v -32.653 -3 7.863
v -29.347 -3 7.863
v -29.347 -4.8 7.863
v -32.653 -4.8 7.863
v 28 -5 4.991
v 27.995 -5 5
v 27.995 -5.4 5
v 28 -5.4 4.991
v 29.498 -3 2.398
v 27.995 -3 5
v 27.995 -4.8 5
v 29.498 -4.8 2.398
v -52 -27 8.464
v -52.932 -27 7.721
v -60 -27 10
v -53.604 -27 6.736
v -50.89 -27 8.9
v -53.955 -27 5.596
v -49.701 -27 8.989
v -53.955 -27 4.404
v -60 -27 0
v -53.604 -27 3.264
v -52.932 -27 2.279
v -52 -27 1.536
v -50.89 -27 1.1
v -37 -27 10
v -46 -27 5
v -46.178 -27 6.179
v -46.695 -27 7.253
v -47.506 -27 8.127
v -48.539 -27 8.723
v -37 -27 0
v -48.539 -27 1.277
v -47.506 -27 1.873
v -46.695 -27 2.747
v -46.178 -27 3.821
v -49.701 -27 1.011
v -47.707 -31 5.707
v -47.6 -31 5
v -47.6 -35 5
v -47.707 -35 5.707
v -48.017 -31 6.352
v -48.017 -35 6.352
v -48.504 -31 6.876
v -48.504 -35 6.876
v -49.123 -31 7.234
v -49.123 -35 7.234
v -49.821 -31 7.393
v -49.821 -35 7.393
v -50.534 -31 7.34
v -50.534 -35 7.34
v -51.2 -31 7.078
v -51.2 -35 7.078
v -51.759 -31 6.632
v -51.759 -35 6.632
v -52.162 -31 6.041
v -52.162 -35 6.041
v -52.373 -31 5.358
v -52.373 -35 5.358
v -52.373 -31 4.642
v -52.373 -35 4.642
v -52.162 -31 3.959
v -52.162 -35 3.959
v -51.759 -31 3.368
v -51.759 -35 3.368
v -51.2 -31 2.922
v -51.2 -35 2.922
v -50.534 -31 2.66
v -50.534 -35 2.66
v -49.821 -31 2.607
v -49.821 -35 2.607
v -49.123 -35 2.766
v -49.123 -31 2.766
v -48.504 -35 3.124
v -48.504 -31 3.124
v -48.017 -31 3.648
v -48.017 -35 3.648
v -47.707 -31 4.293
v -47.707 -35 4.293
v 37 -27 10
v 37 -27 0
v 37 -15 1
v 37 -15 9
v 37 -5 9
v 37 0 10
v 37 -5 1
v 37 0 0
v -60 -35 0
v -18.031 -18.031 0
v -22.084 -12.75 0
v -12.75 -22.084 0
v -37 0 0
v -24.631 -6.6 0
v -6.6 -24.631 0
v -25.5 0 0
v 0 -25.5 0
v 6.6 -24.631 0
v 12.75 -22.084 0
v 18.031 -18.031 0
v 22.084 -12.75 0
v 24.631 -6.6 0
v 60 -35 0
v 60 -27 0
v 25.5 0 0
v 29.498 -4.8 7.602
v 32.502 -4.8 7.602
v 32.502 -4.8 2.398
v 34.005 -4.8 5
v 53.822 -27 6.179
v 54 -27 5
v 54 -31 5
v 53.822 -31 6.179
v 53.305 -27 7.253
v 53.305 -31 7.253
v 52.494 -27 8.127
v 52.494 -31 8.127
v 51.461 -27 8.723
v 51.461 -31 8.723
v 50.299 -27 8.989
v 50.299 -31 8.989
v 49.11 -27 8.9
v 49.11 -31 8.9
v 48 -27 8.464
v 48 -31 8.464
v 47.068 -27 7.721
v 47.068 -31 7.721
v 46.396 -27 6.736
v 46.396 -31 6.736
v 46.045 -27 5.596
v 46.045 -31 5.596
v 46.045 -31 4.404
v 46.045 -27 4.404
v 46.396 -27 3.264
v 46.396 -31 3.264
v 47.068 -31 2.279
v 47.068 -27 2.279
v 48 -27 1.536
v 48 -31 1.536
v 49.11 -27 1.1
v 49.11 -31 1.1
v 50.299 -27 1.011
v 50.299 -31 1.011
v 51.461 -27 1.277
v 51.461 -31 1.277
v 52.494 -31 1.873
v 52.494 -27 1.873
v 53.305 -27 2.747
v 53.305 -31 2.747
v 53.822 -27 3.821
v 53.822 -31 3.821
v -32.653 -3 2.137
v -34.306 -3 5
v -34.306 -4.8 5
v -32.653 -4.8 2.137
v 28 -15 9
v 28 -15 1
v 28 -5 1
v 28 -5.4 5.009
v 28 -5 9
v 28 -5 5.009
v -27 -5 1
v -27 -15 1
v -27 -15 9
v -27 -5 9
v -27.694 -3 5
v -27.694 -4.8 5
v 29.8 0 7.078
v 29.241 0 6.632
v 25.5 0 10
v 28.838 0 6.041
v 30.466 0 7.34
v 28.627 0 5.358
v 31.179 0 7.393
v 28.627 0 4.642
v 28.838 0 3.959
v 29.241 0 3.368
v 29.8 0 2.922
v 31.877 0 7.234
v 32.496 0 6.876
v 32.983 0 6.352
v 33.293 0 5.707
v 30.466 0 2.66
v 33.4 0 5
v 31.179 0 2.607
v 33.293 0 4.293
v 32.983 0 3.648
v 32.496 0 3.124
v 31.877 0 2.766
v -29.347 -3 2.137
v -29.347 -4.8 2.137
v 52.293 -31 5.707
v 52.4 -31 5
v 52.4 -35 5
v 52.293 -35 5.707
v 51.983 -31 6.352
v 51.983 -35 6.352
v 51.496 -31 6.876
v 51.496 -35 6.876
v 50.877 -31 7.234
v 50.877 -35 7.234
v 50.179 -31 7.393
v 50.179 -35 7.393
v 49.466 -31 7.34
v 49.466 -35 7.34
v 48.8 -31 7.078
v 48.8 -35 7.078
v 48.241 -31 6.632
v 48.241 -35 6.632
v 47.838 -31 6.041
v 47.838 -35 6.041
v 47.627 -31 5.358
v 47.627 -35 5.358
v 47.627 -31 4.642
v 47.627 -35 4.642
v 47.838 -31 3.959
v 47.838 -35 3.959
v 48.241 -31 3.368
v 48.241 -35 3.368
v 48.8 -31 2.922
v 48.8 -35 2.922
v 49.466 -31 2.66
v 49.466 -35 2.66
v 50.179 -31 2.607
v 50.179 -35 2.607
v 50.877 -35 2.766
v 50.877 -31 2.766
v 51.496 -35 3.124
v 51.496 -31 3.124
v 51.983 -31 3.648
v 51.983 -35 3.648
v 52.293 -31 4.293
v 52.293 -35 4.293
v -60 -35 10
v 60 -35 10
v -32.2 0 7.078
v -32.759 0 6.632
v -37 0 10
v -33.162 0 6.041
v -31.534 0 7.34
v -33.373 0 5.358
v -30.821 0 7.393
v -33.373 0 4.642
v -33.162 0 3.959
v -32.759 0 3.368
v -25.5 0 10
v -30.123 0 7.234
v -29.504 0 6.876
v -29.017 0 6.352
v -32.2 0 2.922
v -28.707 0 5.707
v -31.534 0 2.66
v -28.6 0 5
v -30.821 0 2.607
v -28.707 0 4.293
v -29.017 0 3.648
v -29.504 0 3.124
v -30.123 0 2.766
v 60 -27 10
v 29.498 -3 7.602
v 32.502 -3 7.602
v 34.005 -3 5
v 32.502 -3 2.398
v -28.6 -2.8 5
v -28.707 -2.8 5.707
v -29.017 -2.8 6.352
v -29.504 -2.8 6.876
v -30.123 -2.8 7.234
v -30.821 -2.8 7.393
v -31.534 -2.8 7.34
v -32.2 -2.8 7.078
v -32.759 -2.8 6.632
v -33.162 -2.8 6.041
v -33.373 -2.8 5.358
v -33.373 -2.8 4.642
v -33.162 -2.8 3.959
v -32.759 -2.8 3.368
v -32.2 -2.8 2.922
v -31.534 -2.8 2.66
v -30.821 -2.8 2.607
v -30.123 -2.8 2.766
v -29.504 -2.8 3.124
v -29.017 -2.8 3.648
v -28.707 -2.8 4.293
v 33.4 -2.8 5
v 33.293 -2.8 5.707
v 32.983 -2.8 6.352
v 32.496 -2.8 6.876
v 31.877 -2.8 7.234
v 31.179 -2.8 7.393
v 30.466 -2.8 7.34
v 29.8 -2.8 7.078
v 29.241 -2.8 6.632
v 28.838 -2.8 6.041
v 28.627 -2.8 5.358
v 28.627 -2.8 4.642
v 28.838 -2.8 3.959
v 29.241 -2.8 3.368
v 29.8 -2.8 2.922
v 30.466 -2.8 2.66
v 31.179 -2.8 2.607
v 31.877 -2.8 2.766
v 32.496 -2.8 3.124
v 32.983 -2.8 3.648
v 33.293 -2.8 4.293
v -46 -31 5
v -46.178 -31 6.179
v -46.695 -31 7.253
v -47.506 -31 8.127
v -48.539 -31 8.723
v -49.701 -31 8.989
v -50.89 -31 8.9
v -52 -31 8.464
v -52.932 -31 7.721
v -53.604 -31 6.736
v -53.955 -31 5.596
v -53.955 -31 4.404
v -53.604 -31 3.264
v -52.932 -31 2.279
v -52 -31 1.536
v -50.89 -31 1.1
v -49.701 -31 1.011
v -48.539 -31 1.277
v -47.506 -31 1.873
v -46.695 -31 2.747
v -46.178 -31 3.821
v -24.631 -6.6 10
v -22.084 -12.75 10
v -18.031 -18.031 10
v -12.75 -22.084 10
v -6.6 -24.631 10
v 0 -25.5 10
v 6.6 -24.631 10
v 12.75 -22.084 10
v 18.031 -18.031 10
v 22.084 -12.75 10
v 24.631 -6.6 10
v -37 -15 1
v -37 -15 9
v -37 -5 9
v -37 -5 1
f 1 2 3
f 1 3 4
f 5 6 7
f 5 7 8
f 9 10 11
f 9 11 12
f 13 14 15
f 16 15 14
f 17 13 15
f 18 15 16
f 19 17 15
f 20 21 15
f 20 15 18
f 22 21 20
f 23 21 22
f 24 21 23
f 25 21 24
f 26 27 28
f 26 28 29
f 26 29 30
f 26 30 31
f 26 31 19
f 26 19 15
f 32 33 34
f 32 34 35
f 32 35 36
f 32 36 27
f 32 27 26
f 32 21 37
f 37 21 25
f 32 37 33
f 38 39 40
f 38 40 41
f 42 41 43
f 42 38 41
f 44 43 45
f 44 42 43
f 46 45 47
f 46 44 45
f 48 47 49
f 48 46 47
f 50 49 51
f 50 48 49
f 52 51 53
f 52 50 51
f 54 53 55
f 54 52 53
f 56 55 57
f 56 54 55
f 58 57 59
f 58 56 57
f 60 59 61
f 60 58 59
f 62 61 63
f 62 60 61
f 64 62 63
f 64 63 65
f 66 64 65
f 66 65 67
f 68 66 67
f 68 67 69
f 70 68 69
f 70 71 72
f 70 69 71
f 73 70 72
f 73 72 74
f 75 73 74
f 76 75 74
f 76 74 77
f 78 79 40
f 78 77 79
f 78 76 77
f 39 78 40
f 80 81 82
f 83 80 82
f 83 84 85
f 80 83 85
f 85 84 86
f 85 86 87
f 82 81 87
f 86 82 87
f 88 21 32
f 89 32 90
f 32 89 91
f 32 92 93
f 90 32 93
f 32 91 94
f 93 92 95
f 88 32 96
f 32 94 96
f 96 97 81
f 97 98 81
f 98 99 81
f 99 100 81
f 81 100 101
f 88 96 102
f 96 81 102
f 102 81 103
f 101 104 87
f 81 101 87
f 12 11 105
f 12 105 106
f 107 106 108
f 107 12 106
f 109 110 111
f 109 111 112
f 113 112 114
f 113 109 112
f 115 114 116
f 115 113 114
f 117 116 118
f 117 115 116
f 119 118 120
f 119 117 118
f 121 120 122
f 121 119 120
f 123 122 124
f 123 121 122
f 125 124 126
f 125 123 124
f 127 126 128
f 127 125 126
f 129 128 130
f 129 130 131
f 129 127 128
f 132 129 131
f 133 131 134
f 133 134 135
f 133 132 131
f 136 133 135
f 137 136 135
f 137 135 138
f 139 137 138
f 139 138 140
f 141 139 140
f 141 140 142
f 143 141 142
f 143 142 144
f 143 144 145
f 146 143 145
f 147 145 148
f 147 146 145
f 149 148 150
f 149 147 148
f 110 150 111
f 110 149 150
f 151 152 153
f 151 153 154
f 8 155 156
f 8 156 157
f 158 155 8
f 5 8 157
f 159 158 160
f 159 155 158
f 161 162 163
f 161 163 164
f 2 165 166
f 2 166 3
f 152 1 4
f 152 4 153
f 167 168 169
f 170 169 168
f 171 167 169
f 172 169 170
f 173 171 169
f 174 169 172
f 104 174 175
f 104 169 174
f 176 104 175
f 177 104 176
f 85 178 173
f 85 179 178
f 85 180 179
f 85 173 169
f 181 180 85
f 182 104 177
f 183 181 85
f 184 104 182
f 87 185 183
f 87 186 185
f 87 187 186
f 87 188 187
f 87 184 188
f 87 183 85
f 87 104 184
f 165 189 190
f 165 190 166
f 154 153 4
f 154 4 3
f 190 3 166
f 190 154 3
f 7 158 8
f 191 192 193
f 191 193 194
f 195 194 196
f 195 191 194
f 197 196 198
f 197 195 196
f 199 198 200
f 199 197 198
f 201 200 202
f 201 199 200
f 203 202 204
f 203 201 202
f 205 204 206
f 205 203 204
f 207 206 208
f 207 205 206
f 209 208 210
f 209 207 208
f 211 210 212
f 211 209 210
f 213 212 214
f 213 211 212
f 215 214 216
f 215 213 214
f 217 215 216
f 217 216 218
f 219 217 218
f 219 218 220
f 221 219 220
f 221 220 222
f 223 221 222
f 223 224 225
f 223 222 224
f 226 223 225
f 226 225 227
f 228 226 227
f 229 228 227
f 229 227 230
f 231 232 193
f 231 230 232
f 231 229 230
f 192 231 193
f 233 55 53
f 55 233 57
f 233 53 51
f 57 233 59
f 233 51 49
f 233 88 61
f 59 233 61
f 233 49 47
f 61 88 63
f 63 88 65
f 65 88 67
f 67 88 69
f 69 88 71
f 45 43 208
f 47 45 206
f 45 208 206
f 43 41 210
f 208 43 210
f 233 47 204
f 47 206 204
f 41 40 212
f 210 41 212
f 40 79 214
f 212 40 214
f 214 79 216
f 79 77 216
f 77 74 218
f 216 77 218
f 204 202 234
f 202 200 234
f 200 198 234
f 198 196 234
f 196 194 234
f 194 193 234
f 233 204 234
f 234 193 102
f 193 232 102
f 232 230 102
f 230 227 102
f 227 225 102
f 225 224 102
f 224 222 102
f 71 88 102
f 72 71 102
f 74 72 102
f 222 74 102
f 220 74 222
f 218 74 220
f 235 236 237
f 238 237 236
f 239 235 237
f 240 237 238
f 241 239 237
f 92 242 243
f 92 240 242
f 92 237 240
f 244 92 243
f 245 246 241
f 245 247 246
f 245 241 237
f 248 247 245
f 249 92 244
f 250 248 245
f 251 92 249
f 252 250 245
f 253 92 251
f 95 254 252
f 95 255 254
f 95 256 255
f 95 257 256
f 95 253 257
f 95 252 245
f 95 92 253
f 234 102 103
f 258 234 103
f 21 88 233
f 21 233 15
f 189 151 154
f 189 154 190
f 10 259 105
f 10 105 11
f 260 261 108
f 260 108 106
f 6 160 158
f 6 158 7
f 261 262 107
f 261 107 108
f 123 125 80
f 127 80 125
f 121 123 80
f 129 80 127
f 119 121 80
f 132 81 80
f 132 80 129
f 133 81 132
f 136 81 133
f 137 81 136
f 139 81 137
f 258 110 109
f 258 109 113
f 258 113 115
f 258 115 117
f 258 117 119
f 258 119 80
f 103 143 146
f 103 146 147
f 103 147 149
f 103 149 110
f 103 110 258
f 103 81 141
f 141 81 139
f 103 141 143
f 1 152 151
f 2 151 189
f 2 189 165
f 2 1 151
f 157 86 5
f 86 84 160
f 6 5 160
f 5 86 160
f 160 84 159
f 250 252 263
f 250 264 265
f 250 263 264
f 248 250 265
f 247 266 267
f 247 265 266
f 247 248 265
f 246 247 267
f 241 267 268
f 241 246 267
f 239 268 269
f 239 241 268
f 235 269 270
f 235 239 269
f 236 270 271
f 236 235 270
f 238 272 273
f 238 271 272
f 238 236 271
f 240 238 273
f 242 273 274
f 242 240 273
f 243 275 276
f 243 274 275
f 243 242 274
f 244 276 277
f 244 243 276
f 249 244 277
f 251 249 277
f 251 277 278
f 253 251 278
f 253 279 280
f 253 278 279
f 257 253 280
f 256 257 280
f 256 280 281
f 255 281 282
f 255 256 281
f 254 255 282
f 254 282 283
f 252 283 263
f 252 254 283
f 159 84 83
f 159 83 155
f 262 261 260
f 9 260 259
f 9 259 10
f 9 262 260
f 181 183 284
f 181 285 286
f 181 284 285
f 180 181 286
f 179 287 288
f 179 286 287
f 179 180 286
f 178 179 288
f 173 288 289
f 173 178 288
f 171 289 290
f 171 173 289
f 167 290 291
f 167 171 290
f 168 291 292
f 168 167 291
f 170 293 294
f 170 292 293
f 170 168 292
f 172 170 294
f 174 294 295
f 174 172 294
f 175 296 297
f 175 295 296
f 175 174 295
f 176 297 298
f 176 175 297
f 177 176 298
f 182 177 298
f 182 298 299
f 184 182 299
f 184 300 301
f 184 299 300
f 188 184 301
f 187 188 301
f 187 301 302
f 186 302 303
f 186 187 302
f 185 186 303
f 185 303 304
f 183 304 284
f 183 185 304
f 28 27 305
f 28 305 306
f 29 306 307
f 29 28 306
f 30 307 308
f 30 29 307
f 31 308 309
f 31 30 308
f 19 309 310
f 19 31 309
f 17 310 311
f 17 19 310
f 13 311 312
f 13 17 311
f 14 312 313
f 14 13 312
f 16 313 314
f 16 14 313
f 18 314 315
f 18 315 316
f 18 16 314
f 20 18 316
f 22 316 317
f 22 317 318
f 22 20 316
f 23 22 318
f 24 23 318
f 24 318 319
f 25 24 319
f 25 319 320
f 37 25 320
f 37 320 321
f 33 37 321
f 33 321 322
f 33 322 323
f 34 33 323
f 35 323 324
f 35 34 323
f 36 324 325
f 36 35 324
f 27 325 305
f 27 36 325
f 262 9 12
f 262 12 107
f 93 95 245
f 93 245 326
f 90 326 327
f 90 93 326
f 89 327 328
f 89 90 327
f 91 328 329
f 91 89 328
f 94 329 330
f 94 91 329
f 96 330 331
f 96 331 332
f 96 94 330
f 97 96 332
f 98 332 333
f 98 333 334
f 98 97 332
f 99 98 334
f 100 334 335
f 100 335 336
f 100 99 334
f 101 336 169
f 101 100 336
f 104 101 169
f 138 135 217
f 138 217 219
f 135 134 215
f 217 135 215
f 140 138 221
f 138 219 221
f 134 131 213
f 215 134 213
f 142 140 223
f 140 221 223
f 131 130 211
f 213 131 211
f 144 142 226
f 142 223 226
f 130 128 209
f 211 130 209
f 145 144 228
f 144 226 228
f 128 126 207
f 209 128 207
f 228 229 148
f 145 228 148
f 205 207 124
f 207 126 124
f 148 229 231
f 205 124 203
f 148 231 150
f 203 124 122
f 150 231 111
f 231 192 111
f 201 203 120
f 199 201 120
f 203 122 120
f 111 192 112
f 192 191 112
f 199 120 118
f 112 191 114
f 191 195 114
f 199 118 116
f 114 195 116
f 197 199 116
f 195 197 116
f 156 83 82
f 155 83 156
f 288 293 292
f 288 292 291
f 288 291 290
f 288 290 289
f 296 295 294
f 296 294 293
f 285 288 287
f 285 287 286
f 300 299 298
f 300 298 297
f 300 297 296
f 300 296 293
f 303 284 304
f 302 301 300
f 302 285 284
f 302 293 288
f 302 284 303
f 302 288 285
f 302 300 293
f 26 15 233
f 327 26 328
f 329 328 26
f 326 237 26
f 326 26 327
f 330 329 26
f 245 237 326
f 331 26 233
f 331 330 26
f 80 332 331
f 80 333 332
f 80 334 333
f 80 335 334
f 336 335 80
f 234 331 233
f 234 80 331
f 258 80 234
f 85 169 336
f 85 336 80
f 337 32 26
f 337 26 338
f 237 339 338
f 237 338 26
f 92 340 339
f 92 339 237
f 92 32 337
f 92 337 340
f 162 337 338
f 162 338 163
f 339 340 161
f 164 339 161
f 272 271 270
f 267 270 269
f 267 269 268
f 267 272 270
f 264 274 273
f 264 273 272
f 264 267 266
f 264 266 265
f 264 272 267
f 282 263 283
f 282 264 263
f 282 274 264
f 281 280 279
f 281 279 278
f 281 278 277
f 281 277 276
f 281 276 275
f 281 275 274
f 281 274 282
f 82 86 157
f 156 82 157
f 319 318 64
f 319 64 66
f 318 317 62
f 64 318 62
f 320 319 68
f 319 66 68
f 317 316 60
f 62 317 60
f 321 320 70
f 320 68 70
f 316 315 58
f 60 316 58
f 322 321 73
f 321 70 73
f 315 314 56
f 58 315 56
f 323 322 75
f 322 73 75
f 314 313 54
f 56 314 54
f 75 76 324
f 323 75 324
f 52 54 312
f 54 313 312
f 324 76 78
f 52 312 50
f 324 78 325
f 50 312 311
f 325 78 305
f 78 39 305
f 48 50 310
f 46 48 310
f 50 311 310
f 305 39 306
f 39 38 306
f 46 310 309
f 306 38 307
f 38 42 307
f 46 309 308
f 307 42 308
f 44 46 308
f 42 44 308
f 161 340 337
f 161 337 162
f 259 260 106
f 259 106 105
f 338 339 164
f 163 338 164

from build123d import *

# Parameters (mm, degrees)
BOX008_W                  = 200
BOX008_H                  = 200
BOX008_DEPTH              = 10
CYLINDER014_R             = 4
CYLINDER014_DEPTH         = 4
CYLINDER015_R             = 2.4
CYLINDER015_DEPTH         = 10
FUSION014_PLACEMENT_ANGLE = 90
CYLINDER016_R             = 4
CYLINDER016_DEPTH         = 4
CYLINDER017_R             = 2.4
CYLINDER017_DEPTH         = 10
FUSION015_PLACEMENT_ANGLE = 90
BOX007_W                  = 120
BOX007_H                  = 8
BOX007_DEPTH              = 10
CYLINDER012_R             = 4
CYLINDER012_DEPTH         = 10
CYLINDER013_R             = 4
CYLINDER013_DEPTH         = 10
CYLINDER010_R             = 2.4
CYLINDER010_DEPTH         = 100
CYLINDER011_R             = 2.4
CYLINDER011_DEPTH         = 100
EXTRUDE_DEPTH             = 2.4
LINK003_PLACEMENT_ANGLE   = 90
BOX006_W                  = 11
BOX006_H                  = 10
BOX006_DEPTH              = 8
FUSION010_PLACEMENT_ANGLE = 180
BOX005_W                  = 10
BOX005_H                  = 10
BOX005_DEPTH              = 8
LINK002_SCALE_SCALE       = 1.1
LINK002_PLACEMENT_ANGLE   = 90
CYLINDER009_R             = 25.5
CYLINDER009_DEPTH         = 10
BOX004_W                  = 74
BOX004_H                  = 70
BOX004_DEPTH              = 10
BOX010_W                  = 10
BOX010_H                  = 0.2
BOX010_DEPTH              = 10
BOX011_W                  = 10
BOX011_H                  = 0.2
BOX011_DEPTH              = 10
BOX012_W                  = 10
BOX012_H                  = 0.2
BOX012_DEPTH              = 10
BOX013_W                  = 10
BOX013_H                  = 0.2
BOX013_DEPTH              = 10


with BuildPart() as cube008:
    # Box008 → Box008 (new body)
    with BuildSketch(Plane(origin=(-100, 0, 0), x_dir=(1, 0, 0), z_dir=(0, 0, 1))):
        with Locations((100, 100)):
            Rectangle(BOX008_W, BOX008_H)
    extrude(amount=BOX008_DEPTH)


with BuildPart() as cylinder014:
    # Cylinder014 → Cylinder014 (new body)
    with BuildSketch(Plane.XY):
        Circle(CYLINDER014_R)
    extrude(amount=CYLINDER014_DEPTH)


with BuildPart() as fusion014:
    # Cylinder015 → Cylinder015 (new body)
    with BuildSketch(Plane.XY):
        Circle(CYLINDER015_R)
    extrude(amount=CYLINDER015_DEPTH)

    # Fusion014: union Cylinder014
    add(cylinder014.part)


with BuildPart() as fusion014_1:
    # Fusion014 placement: moved
    add(fusion014.part.moved(Location((-50, -27, 5))).rotate(Axis((-50, -27, 5), (1, 0, 0)), FUSION014_PLACEMENT_ANGLE))


with BuildPart() as cylinder016:
    # Cylinder016 → Cylinder016 (new body)
    with BuildSketch(Plane.XY):
        Circle(CYLINDER016_R)
    extrude(amount=CYLINDER016_DEPTH)


with BuildPart() as fusion016:
    # Cylinder017 → Cylinder017 (new body)
    with BuildSketch(Plane.XY):
        Circle(CYLINDER017_R)
    extrude(amount=CYLINDER017_DEPTH)

    # Fusion015: union Cylinder016
    add(cylinder016.part)


with BuildPart() as fusion016_1:
    # Fusion015 placement: moved
    add(fusion016.part.moved(Location((50, -27, 5))).rotate(Axis((50, -27, 5), (1, 0, 0)), FUSION015_PLACEMENT_ANGLE))

    # Fusion016: union Fusion014
    add(fusion014_1.part)


with BuildPart() as cut009:
    # Box007 → Box007 (new body)
    with BuildSketch(Plane(origin=(-60, -35, 0), x_dir=(1, 0, 0), z_dir=(0, 0, 1))):
        with Locations((60, 4)):
            Rectangle(BOX007_W, BOX007_H)
    extrude(amount=BOX007_DEPTH)

    # Cut009: cut Fusion016
    add(fusion016_1.part, mode=Mode.SUBTRACT)


with BuildPart() as cylinder012:
    # Cylinder012 → Cylinder012 (new body)
    with BuildSketch(Plane(origin=(31, 35, 5), x_dir=(1, 0, 0), z_dir=(0, -1, 0))):
        Circle(CYLINDER012_R)
    extrude(amount=CYLINDER012_DEPTH)


with BuildPart() as fusion013:
    # Cylinder013 → Cylinder013 (new body)
    with BuildSketch(Plane(origin=(-31, 35, 5), x_dir=(1, 0, 0), z_dir=(0, -1, 0))):
        Circle(CYLINDER013_R)
    extrude(amount=CYLINDER013_DEPTH)

    # Fusion013: union Cylinder012
    add(cylinder012.part)


with BuildPart() as cylinder010:
    # Cylinder010 → Cylinder010 (new body)
    with BuildSketch(Plane(origin=(-31, 94, 5), x_dir=(1, 0, 0), z_dir=(0, -1, 0))):
        Circle(CYLINDER010_R)
    extrude(amount=CYLINDER010_DEPTH)


with BuildPart() as fusion012:
    # Cylinder011 → Cylinder011 (new body)
    with BuildSketch(Plane(origin=(31, 94, 5), x_dir=(1, 0, 0), z_dir=(0, -1, 0))):
        Circle(CYLINDER011_R)
    extrude(amount=CYLINDER011_DEPTH)

    # Fusion012: union Cylinder010
    add(cylinder010.part)


with BuildPart() as din934_m006:
    # Sketch → Extrude (new body)
    with BuildSketch(Plane.XY):
        Polygon((-3.005, 0), (-1.5025, -2.602406), (1.5025, -2.602406), (3.005, 0), (1.5025, 2.602406), (-1.5025, 2.602406), align=None)
    extrude(amount=EXTRUDE_DEPTH)


with BuildPart() as din934_m008:
    # Link003 base: copy of DIN934_M006
    add(din934_m006.part)


with BuildPart() as din934_m008_1:
    # Link003 placement: moved
    add(din934_m008.part.moved(Location((-31, -3, 5))).rotate(Axis((-31, -3, 5), (1, 0, 0)), LINK003_PLACEMENT_ANGLE))


with BuildPart() as fusion010:
    # Box006 → Box006 (new body)
    with BuildSketch(Plane(origin=(-39, -15, 1), x_dir=(1, 0, 0), z_dir=(0, 0, 1))):
        with Locations((5.5, 5)):
            Rectangle(BOX006_W, BOX006_H)
    extrude(amount=BOX006_DEPTH)

    # Fusion010: union DIN934_M008
    add(din934_m008_1.part)


with BuildPart() as fusion010_1:
    # Fusion010 placement: moved
    add(fusion010.part.moved(Location((0, 0, 10))).rotate(Axis((0, 0, 10), (0, 1, 0)), FUSION010_PLACEMENT_ANGLE))


with BuildPart() as cube005:
    # Box005 → Box005 (new body)
    with BuildSketch(Plane(origin=(-37, -15, 1), x_dir=(1, 0, 0), z_dir=(0, 0, 1))):
        with Locations((5, 5)):
            Rectangle(BOX005_W, BOX005_H)
    extrude(amount=BOX005_DEPTH)


with BuildPart() as fusion011:
    # Link002 base: copy of DIN934_M006
    add(din934_m006.part)


with BuildPart() as fusion011_1:
    # Link002 scale: moved
    add(fusion011.part.scale(LINK002_SCALE_SCALE))


with BuildPart() as fusion011_2:
    # Link002 placement: moved
    add(fusion011_1.part.moved(Location((-31, -3, 5))).rotate(Axis((-31, -3, 5), (1, 0, 0)), LINK002_PLACEMENT_ANGLE))

    # Fusion009: union Cube005
    add(cube005.part)

    # Fusion011: union Fusion010
    add(fusion010_1.part)


with BuildPart() as cylinder009:
    # Cylinder009 → Cylinder009 (new body)
    with BuildSketch(Plane.XY):
        Circle(CYLINDER009_R)
    extrude(amount=CYLINDER009_DEPTH)


with BuildPart() as lowerpart:
    # Box004 → Box004 (new body)
    with BuildSketch(Plane(origin=(-37, -35, 0), x_dir=(1, 0, 0), z_dir=(0, 0, 1))):
        with Locations((37, 35)):
            Rectangle(BOX004_W, BOX004_H)
    extrude(amount=BOX004_DEPTH)

    # Cut005: cut Cylinder009
    add(cylinder009.part, mode=Mode.SUBTRACT)

    # Cut006: cut Fusion011
    add(fusion011_2.part, mode=Mode.SUBTRACT)

    # Cut007: cut Fusion012
    add(fusion012.part, mode=Mode.SUBTRACT)

    # Cut008: cut Fusion013
    add(fusion013.part, mode=Mode.SUBTRACT)

    # Fusion017: union Cut009
    add(cut009.part)

    # Cut011: cut Cube008
    add(cube008.part, mode=Mode.SUBTRACT)


with BuildPart() as cube010:
    # Box010 → Box010 (new body)
    with BuildSketch(Plane(origin=(-37, -5, 0), x_dir=(1, 0, 0), z_dir=(0, 0, 1))):
        with Locations((5, 0.1)):
            Rectangle(BOX010_W, BOX010_H)
    extrude(amount=BOX010_DEPTH)


with BuildPart() as cube011:
    # Box011 → Box011 (new body)
    with BuildSketch(Plane(origin=(-37, -3, 0), x_dir=(1, 0, 0), z_dir=(0, 0, 1))):
        with Locations((5, 0.1)):
            Rectangle(BOX011_W, BOX011_H)
    extrude(amount=BOX011_DEPTH)


with BuildPart() as cube012:
    # Box012 → Box012 (new body)
    with BuildSketch(Plane(origin=(27, -3, 0), x_dir=(1, 0, 0), z_dir=(0, 0, 1))):
        with Locations((5, 0.1)):
            Rectangle(BOX012_W, BOX012_H)
    extrude(amount=BOX012_DEPTH)


with BuildPart() as lowerpart_print:
    # Box013 → Box013 (new body)
    with BuildSketch(Plane(origin=(27, -5, 0), x_dir=(1, 0, 0), z_dir=(0, 0, 1))):
        with Locations((5, 0.1)):
            Rectangle(BOX013_W, BOX013_H)
    extrude(amount=BOX013_DEPTH)

    # Fusion018: union Cube010, Cube011, Cube012
    add(cube010.part)
    add(cube011.part)
    add(cube012.part)

    # Fusion019: union LowerPart
    add(lowerpart.part)


solid = lowerpart_print.part
